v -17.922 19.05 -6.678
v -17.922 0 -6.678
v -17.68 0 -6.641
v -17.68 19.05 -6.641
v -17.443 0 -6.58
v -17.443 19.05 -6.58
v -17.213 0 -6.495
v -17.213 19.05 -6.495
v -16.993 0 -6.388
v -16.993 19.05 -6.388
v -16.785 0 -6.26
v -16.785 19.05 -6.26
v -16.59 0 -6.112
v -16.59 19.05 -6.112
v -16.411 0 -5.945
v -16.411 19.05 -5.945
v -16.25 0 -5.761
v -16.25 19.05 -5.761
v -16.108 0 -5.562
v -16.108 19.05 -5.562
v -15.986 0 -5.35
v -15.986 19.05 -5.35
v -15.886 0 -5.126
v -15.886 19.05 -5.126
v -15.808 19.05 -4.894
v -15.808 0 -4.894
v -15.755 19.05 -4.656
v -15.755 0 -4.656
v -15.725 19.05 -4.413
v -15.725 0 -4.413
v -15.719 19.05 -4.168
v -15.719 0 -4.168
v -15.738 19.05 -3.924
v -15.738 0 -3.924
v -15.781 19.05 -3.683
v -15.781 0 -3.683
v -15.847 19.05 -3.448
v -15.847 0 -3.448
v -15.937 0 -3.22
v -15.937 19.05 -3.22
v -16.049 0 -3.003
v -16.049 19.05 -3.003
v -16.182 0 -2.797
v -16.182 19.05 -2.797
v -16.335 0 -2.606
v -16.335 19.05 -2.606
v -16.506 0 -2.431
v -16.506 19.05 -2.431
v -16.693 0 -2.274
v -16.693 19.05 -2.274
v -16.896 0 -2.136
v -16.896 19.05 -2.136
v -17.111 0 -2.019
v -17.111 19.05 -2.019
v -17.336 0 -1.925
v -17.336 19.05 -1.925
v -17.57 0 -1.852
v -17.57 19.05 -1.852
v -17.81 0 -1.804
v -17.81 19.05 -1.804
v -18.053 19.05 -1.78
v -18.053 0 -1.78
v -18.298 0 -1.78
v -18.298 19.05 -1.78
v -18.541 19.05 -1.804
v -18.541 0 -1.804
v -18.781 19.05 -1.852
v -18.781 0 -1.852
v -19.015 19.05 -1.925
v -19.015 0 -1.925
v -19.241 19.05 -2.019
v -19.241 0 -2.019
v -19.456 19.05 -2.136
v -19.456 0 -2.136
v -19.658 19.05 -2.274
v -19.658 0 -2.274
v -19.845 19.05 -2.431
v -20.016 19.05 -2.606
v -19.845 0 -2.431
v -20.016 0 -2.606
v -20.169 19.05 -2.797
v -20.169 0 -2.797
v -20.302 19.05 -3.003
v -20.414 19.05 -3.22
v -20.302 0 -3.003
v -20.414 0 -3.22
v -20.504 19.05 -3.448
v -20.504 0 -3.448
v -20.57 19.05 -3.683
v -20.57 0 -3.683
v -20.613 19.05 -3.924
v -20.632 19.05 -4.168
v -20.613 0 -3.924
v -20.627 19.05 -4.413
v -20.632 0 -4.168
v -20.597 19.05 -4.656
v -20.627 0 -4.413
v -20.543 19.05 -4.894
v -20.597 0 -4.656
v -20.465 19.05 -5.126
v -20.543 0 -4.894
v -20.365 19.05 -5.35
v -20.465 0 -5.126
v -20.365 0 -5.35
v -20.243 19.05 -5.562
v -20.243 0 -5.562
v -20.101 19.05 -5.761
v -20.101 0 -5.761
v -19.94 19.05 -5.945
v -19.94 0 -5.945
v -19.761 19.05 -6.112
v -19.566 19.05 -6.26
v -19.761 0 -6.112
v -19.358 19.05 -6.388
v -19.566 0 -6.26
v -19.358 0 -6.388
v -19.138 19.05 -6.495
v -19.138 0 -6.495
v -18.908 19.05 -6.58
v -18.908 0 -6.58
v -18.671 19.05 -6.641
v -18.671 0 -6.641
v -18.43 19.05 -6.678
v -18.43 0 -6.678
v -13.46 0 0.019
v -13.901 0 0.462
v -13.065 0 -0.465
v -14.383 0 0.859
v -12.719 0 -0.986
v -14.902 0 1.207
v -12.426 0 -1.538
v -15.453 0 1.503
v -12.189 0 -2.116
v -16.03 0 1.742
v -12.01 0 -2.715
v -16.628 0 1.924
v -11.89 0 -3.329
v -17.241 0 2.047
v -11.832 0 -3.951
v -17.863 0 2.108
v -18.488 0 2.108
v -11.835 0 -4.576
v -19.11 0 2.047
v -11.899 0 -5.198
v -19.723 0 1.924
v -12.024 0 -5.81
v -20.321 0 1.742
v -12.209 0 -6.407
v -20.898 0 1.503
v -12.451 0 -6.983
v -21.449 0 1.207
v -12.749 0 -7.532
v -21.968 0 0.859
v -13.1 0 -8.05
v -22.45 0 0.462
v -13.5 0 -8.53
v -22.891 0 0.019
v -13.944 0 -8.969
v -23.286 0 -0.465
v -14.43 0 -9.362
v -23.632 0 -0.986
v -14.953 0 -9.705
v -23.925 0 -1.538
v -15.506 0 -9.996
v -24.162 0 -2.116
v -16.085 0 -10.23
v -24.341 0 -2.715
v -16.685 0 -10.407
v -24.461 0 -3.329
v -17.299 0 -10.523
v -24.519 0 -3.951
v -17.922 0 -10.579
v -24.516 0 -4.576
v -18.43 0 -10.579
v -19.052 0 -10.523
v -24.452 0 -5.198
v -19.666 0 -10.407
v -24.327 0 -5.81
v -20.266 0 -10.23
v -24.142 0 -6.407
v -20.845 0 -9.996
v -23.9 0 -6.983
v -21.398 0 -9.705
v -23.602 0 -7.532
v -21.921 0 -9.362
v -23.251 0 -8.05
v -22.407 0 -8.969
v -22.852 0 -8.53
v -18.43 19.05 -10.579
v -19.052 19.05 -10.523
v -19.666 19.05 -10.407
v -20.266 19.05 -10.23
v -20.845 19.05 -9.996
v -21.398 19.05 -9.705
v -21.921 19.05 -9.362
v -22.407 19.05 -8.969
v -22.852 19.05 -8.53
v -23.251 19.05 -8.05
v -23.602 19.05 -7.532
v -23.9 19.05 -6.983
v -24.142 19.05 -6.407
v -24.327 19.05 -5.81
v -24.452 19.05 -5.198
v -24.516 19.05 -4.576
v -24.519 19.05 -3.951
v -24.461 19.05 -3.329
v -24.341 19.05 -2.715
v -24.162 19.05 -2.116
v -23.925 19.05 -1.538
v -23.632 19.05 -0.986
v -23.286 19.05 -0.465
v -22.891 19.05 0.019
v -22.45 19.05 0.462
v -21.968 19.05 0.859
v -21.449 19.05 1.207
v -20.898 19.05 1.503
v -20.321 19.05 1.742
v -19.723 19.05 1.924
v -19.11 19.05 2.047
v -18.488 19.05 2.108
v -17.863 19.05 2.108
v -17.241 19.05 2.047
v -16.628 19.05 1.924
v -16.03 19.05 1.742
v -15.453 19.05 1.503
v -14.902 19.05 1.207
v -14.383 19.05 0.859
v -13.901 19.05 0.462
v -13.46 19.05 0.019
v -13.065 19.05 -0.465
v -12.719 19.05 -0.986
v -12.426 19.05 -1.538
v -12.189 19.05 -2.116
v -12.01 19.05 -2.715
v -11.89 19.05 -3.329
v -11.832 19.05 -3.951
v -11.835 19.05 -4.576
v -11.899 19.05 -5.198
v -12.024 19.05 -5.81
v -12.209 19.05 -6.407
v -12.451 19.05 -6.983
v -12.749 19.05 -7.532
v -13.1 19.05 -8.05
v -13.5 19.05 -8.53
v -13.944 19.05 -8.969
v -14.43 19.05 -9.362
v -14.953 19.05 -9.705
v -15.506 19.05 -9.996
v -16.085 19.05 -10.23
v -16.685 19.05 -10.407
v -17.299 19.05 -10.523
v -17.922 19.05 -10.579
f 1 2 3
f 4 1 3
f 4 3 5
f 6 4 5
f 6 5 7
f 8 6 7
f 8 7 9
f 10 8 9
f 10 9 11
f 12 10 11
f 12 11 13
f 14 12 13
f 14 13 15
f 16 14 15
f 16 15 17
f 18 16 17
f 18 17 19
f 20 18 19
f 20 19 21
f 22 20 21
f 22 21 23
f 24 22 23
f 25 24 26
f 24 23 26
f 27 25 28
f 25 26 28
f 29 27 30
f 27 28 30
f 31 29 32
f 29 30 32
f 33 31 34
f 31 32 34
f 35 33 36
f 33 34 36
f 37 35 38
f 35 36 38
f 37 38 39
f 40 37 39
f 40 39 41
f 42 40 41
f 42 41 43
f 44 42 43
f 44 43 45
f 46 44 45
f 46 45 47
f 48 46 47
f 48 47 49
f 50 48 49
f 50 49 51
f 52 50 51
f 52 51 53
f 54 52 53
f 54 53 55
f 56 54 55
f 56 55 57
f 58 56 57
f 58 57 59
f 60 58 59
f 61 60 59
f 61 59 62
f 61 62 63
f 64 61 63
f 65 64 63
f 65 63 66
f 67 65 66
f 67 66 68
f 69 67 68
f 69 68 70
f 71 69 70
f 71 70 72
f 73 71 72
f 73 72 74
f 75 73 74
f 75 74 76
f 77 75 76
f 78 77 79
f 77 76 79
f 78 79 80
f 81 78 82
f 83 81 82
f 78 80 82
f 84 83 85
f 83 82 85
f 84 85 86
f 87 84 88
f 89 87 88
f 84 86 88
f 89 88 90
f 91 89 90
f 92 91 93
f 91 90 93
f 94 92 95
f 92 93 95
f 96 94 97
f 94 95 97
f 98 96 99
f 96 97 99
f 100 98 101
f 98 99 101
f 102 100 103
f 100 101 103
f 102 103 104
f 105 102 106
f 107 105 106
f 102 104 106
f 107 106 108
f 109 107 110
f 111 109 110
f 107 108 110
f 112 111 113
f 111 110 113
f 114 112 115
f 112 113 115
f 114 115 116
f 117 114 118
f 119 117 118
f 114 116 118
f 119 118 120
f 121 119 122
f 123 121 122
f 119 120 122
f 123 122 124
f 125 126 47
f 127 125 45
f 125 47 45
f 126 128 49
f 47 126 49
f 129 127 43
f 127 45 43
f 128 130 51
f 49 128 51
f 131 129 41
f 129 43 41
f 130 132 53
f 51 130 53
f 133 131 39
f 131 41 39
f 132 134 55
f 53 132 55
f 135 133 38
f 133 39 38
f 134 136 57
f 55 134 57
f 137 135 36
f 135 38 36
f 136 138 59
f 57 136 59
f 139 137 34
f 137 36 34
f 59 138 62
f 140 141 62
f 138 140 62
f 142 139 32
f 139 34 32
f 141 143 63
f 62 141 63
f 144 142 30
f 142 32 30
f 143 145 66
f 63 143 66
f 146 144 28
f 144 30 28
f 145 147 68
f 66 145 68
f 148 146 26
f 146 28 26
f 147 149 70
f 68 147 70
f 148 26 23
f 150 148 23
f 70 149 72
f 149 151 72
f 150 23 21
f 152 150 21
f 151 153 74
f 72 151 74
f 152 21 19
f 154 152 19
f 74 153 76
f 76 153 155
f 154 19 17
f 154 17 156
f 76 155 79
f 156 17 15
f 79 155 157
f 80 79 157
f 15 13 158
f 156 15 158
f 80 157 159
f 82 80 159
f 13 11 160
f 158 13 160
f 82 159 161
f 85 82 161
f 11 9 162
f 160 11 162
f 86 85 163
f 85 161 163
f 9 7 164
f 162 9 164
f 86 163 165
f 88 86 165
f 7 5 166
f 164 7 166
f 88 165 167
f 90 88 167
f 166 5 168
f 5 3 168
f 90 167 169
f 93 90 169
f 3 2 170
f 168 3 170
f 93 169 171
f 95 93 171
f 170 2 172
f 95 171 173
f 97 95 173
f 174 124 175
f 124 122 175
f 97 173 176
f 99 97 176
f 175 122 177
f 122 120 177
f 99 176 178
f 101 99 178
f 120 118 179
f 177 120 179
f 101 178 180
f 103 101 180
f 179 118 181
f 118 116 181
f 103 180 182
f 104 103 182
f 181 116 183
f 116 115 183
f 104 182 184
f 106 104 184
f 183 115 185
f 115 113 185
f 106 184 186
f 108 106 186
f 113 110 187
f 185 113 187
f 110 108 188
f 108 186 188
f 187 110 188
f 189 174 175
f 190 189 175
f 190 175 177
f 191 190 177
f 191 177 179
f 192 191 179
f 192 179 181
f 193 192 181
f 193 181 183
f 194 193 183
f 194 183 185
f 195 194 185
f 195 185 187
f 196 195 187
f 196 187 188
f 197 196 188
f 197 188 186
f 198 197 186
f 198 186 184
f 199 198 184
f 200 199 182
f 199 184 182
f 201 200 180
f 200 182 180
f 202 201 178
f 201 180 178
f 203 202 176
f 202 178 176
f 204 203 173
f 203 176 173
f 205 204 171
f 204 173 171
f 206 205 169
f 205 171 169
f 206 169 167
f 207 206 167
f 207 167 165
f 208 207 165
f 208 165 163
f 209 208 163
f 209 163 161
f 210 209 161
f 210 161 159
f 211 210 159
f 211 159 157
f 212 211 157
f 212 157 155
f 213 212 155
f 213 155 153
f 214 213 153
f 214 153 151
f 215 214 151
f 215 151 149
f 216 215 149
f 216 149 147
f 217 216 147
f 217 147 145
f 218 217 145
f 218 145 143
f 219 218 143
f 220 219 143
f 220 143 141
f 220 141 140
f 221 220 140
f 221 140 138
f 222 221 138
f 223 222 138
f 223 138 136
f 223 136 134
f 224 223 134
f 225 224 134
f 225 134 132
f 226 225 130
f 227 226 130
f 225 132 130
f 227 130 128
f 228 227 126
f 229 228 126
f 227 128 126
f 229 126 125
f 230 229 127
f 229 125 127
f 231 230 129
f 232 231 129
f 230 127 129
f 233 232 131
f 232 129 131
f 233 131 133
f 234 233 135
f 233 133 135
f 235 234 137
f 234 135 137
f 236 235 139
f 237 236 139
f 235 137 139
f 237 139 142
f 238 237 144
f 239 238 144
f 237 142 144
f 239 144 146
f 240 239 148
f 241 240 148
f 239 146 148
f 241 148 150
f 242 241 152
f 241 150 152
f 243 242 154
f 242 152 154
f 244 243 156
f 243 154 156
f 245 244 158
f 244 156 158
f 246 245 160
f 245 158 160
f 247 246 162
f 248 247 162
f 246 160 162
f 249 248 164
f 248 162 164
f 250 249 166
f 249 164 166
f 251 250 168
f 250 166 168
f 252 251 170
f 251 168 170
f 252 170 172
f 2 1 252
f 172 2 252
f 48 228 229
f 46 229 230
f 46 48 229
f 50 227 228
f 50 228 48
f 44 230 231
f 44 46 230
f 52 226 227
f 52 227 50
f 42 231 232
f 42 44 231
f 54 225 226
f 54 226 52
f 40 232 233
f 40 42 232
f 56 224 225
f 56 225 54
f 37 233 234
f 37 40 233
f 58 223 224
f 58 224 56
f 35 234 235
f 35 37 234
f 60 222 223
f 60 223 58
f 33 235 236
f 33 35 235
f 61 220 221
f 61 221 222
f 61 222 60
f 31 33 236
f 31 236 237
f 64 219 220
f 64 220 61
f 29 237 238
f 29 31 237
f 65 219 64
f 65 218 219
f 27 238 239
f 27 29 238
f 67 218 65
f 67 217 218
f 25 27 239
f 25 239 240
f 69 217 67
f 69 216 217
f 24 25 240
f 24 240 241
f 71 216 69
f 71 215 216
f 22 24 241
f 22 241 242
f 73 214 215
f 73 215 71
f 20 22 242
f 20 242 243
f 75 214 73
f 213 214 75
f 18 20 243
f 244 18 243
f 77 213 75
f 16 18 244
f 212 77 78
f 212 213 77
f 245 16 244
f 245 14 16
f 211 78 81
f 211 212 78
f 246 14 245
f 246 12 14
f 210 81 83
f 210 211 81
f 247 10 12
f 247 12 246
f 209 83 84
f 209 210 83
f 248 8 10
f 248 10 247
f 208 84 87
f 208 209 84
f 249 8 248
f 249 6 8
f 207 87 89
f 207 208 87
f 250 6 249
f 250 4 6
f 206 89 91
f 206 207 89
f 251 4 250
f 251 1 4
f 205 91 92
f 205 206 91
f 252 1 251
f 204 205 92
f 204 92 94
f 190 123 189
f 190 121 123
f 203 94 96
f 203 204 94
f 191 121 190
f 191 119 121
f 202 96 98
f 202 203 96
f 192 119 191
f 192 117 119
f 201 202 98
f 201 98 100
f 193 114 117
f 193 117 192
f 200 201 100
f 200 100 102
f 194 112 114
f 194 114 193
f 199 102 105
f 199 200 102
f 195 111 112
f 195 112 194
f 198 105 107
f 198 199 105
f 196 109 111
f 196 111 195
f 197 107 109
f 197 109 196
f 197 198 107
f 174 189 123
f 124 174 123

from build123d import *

# Parameters (mm, degrees)
SKETCH1_R                    = 6.35
BOSS_EXTRUDE1_DEPTH          = 19.05
F_10_0_1935_DIAMETER_HOLE2_D = 4.9149
CUT_EXTRUDE1_DEPTH           = 33.808987893


with BuildPart() as part:
    # Sketch1 → Boss-Extrude1 (new body)
    with BuildSketch(Plane(origin=(0, 0, 0), x_dir=(1, 0, 0), z_dir=(0, 1, 0))):
        with Locations(Location((-18.175558327, 4.234147358, 0), (0, 0, 90))):
            Circle(SKETCH1_R)
    extrude(amount=BOSS_EXTRUDE1_DEPTH)

    # #10 (0.1935) Diameter Hole2 (through all)
    with Locations(Plane(origin=(0, 19.05, 0), x_dir=(1, 0, 0), z_dir=(0, 1, 0))):
        with Locations((-18.175558327, 4.234147358)):
            Hole(F_10_0_1935_DIAMETER_HOLE2_D / 2)

    # Sketch6 → Cut-Extrude1 (cut, through all)
    with BuildSketch(Plane(origin=(0, 19.05, 0), x_dir=(1, 0, 0), z_dir=(0, 1, 0))):
        with BuildLine():
            Line((-18.429558327, 10.579065324), (-18.429558327, 6.678435496))
            ThreePointArc((-18.429558327, 6.678435496), (-18.175558327, 6.691597358), (-17.921558327, 6.678435496))
            Line((-17.921558327, 6.678435496), (-17.921558327, 10.579065324))
            ThreePointArc((-17.921558327, 10.579065324), (-18.175558327, 10.584147358), (-18.429558327, 10.579065324))
        make_face()
    extrude(amount=-CUT_EXTRUDE1_DEPTH, mode=Mode.SUBTRACT)


solid = part.part
